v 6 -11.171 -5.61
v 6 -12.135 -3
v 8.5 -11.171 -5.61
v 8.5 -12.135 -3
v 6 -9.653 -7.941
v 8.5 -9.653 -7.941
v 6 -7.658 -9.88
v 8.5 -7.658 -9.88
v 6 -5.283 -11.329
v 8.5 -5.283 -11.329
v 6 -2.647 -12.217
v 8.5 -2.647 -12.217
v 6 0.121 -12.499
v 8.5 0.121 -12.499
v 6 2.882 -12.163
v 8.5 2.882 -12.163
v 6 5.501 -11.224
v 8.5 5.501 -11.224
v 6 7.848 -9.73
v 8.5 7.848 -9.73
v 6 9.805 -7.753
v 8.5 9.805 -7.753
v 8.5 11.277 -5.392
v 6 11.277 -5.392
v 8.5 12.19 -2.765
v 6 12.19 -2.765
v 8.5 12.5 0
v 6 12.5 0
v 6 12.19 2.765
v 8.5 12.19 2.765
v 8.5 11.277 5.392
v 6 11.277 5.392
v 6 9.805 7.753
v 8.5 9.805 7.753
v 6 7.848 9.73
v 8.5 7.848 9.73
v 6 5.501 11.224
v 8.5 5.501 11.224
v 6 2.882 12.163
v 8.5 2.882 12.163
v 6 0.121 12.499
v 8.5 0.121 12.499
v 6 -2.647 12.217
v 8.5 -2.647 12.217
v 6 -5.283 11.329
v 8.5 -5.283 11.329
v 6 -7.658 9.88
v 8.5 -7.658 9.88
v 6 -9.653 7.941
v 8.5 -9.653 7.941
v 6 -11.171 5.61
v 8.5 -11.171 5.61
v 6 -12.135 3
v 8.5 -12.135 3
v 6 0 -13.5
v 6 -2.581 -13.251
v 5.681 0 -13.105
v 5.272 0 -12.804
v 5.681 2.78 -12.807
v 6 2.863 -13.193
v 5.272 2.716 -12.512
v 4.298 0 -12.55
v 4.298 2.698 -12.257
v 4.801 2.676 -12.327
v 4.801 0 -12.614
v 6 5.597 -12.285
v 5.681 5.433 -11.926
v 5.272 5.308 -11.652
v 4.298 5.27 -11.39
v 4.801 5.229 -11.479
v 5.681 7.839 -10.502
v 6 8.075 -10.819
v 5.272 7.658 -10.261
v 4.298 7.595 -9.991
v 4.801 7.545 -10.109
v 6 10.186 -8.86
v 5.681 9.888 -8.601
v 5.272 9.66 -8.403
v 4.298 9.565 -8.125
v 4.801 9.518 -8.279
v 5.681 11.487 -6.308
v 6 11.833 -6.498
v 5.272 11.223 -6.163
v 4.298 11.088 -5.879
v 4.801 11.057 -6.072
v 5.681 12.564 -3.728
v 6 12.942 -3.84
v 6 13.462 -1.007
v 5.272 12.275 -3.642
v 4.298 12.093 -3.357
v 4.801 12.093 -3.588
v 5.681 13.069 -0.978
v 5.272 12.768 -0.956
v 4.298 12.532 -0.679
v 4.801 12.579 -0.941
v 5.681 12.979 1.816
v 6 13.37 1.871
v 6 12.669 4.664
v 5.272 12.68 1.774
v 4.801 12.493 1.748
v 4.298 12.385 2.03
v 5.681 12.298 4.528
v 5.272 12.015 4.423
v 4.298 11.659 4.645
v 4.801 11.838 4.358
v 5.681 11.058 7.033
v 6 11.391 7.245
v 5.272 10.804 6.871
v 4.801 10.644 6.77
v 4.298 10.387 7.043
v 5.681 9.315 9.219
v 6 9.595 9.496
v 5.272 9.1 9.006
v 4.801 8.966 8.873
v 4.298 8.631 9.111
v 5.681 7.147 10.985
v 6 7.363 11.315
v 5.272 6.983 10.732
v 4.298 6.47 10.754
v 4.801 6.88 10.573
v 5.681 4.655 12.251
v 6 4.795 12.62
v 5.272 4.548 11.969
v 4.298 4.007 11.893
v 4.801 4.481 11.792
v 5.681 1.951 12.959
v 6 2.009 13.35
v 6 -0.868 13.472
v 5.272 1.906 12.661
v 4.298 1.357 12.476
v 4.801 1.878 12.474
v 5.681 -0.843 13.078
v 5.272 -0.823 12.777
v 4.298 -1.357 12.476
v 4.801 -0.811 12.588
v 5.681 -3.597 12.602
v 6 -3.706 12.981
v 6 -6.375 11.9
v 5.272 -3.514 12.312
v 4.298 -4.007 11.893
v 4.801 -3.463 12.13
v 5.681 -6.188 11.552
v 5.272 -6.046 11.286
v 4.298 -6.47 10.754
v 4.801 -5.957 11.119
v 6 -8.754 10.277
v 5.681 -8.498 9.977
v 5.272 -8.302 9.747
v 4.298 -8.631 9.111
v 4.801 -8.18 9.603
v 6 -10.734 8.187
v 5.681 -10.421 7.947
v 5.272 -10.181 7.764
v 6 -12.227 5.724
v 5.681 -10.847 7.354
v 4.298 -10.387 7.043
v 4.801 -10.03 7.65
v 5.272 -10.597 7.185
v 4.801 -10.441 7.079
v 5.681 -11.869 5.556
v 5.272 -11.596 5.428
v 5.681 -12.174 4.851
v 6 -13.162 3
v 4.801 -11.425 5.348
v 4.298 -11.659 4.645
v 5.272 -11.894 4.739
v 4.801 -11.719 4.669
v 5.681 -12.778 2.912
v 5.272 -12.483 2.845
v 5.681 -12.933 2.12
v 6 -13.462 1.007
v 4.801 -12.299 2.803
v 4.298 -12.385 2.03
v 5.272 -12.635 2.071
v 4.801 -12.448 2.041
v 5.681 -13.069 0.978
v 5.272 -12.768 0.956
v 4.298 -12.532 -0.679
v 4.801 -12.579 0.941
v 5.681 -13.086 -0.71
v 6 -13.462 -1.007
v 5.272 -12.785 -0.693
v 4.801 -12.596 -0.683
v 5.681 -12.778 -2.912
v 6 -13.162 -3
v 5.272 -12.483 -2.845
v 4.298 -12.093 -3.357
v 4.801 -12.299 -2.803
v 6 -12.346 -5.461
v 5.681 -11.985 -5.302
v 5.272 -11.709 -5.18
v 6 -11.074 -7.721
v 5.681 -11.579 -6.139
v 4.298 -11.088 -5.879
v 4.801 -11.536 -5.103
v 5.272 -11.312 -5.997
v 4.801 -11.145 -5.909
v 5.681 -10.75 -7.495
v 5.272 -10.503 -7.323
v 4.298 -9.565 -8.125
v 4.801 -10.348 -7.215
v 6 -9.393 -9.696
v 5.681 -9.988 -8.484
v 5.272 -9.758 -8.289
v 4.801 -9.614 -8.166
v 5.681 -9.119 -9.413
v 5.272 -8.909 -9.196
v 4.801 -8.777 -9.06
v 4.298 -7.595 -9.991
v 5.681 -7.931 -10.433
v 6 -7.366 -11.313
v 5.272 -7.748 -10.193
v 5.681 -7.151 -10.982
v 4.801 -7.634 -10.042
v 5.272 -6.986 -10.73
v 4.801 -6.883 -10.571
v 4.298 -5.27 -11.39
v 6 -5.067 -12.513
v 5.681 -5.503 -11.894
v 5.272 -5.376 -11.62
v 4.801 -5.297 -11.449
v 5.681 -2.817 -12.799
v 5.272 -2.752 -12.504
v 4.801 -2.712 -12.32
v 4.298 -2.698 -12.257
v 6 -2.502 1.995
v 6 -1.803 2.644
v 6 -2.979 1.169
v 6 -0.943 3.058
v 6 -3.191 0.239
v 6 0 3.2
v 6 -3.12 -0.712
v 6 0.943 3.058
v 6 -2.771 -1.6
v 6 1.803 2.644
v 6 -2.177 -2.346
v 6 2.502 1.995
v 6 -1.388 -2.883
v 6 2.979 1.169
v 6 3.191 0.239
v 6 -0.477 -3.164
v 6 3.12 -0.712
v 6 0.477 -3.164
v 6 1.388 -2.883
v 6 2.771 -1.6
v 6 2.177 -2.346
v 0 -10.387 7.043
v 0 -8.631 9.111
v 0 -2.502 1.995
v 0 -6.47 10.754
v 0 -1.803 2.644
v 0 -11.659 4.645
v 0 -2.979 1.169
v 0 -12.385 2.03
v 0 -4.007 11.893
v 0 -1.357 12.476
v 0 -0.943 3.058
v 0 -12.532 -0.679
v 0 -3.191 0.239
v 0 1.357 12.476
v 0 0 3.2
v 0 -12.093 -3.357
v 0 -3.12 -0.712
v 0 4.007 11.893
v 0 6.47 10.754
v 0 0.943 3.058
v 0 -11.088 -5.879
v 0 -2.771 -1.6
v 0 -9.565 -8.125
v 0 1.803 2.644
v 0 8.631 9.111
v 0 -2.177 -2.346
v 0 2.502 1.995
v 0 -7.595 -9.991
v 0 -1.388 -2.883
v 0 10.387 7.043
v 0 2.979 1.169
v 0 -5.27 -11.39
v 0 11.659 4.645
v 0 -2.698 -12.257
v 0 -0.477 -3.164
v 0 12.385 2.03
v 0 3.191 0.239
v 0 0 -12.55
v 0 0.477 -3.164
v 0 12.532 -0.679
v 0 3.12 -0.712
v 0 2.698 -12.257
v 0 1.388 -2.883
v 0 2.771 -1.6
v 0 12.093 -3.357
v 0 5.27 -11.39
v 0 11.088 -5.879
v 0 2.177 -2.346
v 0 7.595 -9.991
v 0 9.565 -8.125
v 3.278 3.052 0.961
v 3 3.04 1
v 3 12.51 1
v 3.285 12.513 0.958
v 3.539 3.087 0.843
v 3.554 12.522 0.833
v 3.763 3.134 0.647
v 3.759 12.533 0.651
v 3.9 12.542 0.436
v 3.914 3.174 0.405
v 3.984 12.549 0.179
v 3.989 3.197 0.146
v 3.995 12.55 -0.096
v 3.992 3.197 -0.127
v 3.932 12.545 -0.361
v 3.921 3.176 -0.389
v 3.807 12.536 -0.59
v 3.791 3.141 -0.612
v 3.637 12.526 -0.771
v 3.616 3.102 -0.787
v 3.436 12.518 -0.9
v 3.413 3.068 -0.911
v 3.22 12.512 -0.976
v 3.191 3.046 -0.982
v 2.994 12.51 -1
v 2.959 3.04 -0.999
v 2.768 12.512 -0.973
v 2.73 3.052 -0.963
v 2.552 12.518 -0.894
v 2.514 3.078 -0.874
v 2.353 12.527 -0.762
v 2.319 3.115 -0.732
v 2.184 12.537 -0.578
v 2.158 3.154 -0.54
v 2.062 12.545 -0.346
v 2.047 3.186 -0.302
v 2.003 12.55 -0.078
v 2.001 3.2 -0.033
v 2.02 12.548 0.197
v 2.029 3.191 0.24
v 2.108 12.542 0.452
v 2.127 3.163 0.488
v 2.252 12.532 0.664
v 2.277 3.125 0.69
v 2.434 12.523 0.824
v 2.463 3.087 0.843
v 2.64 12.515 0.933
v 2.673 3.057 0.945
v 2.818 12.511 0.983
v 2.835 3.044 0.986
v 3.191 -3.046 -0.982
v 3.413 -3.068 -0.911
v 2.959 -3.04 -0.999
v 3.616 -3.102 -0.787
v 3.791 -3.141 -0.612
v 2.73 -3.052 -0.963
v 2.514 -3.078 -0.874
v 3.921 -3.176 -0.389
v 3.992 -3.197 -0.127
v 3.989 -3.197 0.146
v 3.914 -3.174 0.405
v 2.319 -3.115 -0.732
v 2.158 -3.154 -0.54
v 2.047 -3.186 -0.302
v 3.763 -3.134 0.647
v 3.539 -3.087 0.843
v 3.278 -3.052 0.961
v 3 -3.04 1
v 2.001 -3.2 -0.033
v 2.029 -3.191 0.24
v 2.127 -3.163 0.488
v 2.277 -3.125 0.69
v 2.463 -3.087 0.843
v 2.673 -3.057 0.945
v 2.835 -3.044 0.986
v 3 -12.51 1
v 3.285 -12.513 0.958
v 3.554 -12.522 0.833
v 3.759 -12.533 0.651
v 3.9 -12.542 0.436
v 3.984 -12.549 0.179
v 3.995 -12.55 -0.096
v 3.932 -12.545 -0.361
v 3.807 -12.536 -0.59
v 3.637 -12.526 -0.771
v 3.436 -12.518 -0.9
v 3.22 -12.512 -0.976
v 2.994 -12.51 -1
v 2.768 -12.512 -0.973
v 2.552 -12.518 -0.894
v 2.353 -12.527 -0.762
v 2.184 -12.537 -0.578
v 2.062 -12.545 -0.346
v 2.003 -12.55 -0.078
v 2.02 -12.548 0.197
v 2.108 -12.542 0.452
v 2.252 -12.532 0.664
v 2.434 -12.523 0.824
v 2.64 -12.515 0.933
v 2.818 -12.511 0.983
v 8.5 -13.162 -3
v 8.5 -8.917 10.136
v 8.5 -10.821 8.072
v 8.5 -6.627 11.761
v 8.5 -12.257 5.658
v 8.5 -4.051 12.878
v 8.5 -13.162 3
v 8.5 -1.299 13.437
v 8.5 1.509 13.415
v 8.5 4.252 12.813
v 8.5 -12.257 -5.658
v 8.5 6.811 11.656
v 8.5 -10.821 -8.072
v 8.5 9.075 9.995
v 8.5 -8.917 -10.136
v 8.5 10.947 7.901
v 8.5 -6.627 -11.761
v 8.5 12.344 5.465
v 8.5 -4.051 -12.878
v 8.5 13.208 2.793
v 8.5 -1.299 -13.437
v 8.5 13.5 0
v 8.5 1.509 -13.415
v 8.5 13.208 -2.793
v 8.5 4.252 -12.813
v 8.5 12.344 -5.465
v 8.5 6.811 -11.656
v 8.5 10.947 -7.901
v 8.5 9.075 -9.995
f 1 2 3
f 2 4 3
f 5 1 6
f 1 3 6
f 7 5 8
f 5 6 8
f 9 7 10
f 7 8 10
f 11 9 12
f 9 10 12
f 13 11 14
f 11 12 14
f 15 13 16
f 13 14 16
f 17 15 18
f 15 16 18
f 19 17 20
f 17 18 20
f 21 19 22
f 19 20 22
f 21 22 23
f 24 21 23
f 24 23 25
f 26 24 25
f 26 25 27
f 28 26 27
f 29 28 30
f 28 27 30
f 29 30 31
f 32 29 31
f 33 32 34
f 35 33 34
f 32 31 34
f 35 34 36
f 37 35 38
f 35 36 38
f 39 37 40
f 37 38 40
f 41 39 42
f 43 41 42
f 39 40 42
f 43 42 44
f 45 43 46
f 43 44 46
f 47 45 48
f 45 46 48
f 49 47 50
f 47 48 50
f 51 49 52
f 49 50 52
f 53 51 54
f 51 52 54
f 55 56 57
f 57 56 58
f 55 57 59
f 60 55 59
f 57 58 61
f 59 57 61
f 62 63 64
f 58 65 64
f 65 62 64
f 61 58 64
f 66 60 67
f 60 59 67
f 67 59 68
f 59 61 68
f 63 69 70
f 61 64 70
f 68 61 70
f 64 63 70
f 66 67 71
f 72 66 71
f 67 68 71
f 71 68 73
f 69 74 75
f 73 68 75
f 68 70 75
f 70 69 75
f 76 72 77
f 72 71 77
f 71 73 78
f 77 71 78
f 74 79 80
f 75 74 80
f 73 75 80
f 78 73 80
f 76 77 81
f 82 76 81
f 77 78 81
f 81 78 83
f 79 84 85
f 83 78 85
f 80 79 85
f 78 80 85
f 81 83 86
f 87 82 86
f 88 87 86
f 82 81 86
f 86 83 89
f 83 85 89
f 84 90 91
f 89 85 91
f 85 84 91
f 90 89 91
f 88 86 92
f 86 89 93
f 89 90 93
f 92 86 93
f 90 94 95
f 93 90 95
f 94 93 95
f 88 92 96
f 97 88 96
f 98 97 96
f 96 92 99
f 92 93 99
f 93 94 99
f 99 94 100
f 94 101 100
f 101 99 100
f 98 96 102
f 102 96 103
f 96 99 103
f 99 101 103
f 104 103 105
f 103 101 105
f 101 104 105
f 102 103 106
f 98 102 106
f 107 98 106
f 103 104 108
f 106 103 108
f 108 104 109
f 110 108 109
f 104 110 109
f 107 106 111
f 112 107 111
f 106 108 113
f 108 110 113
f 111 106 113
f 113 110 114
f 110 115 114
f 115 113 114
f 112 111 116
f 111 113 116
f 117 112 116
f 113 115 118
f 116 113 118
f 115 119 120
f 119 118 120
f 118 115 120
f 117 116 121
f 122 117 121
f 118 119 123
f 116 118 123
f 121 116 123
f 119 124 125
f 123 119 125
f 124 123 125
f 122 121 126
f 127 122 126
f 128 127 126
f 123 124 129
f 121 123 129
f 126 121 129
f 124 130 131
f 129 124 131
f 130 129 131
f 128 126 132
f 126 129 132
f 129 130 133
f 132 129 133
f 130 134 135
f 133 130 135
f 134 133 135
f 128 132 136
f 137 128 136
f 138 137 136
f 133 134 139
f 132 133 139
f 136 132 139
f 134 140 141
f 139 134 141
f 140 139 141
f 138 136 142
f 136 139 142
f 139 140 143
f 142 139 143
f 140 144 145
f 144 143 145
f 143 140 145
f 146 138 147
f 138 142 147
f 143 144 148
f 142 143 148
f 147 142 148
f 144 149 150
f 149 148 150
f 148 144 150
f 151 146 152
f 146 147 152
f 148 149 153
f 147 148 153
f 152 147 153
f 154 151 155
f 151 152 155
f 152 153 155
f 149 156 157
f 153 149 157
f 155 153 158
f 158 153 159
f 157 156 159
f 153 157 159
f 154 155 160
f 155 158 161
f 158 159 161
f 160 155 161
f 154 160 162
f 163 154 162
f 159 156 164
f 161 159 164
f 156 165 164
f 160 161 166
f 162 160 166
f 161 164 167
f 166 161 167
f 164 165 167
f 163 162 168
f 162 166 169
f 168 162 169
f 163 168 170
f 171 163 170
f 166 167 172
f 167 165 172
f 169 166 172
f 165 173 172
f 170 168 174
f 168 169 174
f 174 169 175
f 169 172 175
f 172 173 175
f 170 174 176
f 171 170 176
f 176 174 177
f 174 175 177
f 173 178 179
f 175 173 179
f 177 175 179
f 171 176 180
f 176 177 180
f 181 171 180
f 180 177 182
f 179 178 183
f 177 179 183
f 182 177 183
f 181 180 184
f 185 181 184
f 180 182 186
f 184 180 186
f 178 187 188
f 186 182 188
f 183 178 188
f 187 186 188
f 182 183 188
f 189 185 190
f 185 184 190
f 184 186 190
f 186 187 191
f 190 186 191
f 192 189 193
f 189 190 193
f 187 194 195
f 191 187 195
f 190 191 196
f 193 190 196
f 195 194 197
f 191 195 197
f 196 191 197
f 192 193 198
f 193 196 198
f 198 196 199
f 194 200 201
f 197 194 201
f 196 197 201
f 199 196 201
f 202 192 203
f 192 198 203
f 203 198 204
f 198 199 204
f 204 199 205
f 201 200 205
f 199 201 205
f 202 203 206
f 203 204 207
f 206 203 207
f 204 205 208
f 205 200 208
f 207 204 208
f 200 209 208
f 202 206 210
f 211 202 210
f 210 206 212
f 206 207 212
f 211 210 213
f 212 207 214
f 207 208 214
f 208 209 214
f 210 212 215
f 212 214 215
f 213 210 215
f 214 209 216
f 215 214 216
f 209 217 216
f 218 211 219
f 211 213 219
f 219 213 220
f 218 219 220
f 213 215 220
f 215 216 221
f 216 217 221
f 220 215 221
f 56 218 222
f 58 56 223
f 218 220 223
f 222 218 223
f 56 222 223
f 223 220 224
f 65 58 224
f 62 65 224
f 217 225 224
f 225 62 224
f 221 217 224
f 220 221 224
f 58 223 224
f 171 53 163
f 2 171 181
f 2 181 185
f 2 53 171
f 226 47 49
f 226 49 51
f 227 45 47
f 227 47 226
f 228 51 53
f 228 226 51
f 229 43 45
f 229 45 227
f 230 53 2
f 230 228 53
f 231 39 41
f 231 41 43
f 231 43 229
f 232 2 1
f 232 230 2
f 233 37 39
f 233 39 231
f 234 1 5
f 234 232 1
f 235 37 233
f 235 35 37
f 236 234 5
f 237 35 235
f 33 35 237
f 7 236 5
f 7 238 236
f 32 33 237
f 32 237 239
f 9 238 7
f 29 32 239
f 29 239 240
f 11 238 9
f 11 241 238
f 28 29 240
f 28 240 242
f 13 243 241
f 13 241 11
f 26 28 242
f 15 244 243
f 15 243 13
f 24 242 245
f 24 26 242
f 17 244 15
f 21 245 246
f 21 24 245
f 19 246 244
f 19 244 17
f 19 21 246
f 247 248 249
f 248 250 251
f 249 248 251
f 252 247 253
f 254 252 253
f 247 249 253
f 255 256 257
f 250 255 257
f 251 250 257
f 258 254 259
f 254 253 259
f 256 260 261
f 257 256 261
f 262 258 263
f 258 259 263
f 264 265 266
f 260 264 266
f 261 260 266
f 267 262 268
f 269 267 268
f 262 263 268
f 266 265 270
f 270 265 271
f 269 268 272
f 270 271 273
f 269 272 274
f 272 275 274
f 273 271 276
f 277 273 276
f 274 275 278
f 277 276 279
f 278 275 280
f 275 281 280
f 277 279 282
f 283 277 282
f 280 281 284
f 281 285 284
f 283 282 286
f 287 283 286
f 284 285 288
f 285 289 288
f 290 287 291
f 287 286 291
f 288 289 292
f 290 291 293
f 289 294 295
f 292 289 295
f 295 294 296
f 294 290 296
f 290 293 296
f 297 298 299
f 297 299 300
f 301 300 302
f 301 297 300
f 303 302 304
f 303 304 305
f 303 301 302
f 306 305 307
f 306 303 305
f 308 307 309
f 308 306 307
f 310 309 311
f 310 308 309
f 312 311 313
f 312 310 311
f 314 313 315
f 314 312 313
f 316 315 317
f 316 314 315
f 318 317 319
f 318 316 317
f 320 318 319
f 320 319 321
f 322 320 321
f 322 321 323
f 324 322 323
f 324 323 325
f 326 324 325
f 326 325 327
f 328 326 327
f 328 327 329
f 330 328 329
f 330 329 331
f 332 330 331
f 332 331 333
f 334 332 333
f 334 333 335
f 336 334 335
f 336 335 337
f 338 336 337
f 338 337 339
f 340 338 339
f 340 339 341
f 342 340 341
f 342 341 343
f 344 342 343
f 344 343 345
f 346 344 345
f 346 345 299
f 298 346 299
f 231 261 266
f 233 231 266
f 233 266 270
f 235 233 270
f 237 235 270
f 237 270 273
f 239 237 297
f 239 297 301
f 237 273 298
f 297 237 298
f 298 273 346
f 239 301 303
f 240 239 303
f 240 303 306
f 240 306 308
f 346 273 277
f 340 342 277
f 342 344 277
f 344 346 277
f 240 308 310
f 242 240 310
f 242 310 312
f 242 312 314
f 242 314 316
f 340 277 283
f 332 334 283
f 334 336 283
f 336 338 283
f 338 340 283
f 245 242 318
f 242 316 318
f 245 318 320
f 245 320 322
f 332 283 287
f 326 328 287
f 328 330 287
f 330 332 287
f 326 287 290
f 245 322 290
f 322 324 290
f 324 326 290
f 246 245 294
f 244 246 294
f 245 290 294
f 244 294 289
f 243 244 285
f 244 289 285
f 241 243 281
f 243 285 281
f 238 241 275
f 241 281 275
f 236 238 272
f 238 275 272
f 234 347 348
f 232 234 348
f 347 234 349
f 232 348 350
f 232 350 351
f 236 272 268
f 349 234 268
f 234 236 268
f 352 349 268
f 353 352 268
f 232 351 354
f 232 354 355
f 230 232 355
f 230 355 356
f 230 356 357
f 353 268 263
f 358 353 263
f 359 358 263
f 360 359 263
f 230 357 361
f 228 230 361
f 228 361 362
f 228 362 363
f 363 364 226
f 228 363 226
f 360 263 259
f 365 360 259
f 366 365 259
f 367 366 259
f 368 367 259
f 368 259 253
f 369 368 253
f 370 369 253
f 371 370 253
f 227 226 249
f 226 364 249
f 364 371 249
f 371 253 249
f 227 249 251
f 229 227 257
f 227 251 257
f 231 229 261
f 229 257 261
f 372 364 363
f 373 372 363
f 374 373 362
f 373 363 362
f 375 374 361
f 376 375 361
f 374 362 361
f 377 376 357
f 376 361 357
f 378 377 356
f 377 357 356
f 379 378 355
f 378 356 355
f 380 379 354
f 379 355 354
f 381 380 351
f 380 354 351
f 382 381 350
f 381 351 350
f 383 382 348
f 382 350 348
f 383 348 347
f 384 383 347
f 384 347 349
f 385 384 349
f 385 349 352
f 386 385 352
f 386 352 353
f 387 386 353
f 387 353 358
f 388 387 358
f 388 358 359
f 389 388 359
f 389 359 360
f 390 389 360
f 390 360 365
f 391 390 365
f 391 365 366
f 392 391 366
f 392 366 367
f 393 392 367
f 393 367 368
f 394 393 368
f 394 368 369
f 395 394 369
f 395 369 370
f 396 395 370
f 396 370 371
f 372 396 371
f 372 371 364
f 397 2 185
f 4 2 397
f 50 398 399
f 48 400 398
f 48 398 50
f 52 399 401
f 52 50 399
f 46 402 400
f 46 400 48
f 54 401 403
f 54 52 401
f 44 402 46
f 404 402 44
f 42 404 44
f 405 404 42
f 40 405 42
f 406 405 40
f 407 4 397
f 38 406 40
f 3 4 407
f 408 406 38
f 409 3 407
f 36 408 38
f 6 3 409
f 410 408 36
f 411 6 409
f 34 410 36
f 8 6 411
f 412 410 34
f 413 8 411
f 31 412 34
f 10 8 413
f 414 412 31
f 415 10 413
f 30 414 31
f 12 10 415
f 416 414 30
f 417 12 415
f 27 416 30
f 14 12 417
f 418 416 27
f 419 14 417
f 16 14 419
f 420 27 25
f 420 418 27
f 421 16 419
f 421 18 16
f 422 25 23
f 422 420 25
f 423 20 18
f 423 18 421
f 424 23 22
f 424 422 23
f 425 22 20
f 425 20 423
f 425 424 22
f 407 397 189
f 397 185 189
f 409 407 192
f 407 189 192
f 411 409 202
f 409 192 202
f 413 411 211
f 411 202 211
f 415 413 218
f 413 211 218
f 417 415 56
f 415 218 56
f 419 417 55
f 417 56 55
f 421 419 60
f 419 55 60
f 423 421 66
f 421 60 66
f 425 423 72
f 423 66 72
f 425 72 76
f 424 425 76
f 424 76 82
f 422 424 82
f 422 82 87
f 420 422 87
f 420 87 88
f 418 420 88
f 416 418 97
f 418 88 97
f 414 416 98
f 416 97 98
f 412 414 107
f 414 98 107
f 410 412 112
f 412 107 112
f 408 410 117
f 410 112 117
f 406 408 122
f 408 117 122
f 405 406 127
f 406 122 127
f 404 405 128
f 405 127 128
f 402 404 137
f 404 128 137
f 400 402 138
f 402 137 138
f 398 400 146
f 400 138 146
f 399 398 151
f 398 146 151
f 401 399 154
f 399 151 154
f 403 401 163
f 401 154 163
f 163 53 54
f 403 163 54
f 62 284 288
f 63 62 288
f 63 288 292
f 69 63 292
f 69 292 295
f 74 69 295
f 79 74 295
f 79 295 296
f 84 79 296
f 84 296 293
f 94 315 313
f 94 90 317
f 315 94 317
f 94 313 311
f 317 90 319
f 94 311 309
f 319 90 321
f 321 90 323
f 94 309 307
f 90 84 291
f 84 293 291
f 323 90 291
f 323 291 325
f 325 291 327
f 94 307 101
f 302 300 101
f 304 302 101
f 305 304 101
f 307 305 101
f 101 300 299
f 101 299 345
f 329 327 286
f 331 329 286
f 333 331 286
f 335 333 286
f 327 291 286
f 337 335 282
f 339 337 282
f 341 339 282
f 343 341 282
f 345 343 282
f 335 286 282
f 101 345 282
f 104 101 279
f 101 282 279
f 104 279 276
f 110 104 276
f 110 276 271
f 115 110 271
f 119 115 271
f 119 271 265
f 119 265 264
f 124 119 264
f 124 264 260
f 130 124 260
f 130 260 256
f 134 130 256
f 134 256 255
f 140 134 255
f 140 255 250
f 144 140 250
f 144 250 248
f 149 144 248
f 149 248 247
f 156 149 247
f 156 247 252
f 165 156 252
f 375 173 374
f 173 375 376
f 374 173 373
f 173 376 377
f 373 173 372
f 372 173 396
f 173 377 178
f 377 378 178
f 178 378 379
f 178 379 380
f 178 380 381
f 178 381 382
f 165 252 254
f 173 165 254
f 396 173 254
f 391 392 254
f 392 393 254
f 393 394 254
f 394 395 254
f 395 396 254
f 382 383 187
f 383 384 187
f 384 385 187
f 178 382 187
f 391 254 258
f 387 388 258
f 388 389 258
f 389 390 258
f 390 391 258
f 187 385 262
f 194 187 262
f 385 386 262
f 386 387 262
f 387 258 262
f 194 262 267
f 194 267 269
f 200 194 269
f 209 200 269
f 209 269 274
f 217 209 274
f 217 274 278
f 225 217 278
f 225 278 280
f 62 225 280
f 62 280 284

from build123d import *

# Parameters (mm, degrees)
SKETCH_1_R                      = 12.55
EXTRUDE_1_DEPTH                 = 6
SKETCH_2_R                      = 3.2
CUT_EXTRUDE_1_DEPTH             = 6
CUT_EXTRUDE_2_REACH             = 20.735
SKETCH_3_R                      = 1
CUT_EXTRUDE_2_DIRECTION_2_REACH = 20.735
SKETCH_4_R                      = 13.5
EXTRUDE_2_DEPTH                 = 2.5
SKETCH_5_R                      = 12.5
CUT_EXTRUDE_3_DEPTH             = 2.5
FILLET_2_R                      = 2
SKETCH_6_W                      = 2.5
SKETCH_6_H                      = 6
CUT_EXTRUDE_4_DEPTH             = 15


with BuildPart() as part:
    # 草图1 → 凸台-拉伸1 (new body)
    with BuildSketch(Plane(origin=(0, 0, 0), x_dir=(0, 0, -1), z_dir=(1, 0, 0))):
        Circle(SKETCH_1_R)
    extrude(amount=EXTRUDE_1_DEPTH)

    # 草图2 → 切除-拉伸1 (cut)
    with BuildSketch(Plane.ZY):
        Circle(SKETCH_2_R)
    extrude(amount=-CUT_EXTRUDE_1_DEPTH, mode=Mode.SUBTRACT)

    # 草图3 → 切除-拉伸2 (cut, up to next)
    with BuildSketch(Plane(origin=(0, 0, 0), x_dir=(1, 0, 0), z_dir=(0, 1, 0)), mode=Mode.PRIVATE) as cut_extrude_2_sk1:
        with Locations(Location((3, 0, 0), (0, 0, 270))):
            Circle(SKETCH_3_R)
    cut_extrude_2_tool1 = extrude(cut_extrude_2_sk1.sketch, amount=-CUT_EXTRUDE_2_REACH, mode=Mode.PRIVATE) & part.part
    add(cut_extrude_2_tool1.solids().sort_by_distance((3, 0, 0))[0], mode=Mode.SUBTRACT)

    # 草图3 → 切除-拉伸2 direction 2 (cut, up to next)
    with BuildSketch(Plane(origin=(0, 0, 0), x_dir=(1, 0, 0), z_dir=(0, 1, 0)), mode=Mode.PRIVATE) as cut_extrude_2_direction_2_sk1:
        with Locations(Location((3, 0, 0), (0, 0, 270))):
            Circle(SKETCH_3_R)
    cut_extrude_2_direction_2_tool1 = extrude(cut_extrude_2_direction_2_sk1.sketch, amount=CUT_EXTRUDE_2_DIRECTION_2_REACH, mode=Mode.PRIVATE) & part.part
    add(cut_extrude_2_direction_2_tool1.solids().sort_by_distance((3, 0, 0))[0], mode=Mode.SUBTRACT)

    # 草图4 → 凸台-拉伸2 (add)
    with BuildSketch(Plane(origin=(6, 0, 0), x_dir=(0, 0, -1), z_dir=(1, 0, 0))):
        Circle(SKETCH_4_R)
    extrude(amount=EXTRUDE_2_DEPTH)

    # 草图5 → 切除-拉伸3 (cut)
    with BuildSketch(Plane(origin=(8.5, 0, 0), x_dir=(0, 0, -1), z_dir=(1, 0, 0))):
        Circle(SKETCH_5_R)
    extrude(amount=-CUT_EXTRUDE_3_DEPTH, mode=Mode.SUBTRACT)

    # 圆角2
    # the kernel refuses this fillet: 2 mm, written as the material it adds along each edge
    with BuildSketch(Plane(origin=(6, 0, 0), x_dir=(0, 0, -1), z_dir=(0, -1, 0))) as fillet_2_piece_1:
        with BuildLine():
            CenterArc((14.55, -1.702204453), FILLET_2_R, 121.668243254, 58.331756746)
            Line((12.55, -1.702204453), (12.51, -1.702204453))
            Line((12.51, -1.702204453), (12.51, 0))
            Line((12.51, 0), (12.55, 0.04))
            ThreePointArc((12.55, 0.04), (13.025, 0.04), (13.479, 0.034044089))
            Line((13.479, 0.034044089), (13.5, 0))
        make_face()
    revolve(axis=Axis((6, 0, 0), (1, 0, 0)))

    # 草图6 → 切除-拉伸4 (cut)
    with BuildSketch(Plane(origin=(0, 0, 0), x_dir=(1, 0, 0), z_dir=(0, 1, 0))):
        with Locations((7.25, 0)):
            Rectangle(SKETCH_6_W, SKETCH_6_H)
    extrude(amount=-CUT_EXTRUDE_4_DEPTH, mode=Mode.SUBTRACT)


solid = part.part
